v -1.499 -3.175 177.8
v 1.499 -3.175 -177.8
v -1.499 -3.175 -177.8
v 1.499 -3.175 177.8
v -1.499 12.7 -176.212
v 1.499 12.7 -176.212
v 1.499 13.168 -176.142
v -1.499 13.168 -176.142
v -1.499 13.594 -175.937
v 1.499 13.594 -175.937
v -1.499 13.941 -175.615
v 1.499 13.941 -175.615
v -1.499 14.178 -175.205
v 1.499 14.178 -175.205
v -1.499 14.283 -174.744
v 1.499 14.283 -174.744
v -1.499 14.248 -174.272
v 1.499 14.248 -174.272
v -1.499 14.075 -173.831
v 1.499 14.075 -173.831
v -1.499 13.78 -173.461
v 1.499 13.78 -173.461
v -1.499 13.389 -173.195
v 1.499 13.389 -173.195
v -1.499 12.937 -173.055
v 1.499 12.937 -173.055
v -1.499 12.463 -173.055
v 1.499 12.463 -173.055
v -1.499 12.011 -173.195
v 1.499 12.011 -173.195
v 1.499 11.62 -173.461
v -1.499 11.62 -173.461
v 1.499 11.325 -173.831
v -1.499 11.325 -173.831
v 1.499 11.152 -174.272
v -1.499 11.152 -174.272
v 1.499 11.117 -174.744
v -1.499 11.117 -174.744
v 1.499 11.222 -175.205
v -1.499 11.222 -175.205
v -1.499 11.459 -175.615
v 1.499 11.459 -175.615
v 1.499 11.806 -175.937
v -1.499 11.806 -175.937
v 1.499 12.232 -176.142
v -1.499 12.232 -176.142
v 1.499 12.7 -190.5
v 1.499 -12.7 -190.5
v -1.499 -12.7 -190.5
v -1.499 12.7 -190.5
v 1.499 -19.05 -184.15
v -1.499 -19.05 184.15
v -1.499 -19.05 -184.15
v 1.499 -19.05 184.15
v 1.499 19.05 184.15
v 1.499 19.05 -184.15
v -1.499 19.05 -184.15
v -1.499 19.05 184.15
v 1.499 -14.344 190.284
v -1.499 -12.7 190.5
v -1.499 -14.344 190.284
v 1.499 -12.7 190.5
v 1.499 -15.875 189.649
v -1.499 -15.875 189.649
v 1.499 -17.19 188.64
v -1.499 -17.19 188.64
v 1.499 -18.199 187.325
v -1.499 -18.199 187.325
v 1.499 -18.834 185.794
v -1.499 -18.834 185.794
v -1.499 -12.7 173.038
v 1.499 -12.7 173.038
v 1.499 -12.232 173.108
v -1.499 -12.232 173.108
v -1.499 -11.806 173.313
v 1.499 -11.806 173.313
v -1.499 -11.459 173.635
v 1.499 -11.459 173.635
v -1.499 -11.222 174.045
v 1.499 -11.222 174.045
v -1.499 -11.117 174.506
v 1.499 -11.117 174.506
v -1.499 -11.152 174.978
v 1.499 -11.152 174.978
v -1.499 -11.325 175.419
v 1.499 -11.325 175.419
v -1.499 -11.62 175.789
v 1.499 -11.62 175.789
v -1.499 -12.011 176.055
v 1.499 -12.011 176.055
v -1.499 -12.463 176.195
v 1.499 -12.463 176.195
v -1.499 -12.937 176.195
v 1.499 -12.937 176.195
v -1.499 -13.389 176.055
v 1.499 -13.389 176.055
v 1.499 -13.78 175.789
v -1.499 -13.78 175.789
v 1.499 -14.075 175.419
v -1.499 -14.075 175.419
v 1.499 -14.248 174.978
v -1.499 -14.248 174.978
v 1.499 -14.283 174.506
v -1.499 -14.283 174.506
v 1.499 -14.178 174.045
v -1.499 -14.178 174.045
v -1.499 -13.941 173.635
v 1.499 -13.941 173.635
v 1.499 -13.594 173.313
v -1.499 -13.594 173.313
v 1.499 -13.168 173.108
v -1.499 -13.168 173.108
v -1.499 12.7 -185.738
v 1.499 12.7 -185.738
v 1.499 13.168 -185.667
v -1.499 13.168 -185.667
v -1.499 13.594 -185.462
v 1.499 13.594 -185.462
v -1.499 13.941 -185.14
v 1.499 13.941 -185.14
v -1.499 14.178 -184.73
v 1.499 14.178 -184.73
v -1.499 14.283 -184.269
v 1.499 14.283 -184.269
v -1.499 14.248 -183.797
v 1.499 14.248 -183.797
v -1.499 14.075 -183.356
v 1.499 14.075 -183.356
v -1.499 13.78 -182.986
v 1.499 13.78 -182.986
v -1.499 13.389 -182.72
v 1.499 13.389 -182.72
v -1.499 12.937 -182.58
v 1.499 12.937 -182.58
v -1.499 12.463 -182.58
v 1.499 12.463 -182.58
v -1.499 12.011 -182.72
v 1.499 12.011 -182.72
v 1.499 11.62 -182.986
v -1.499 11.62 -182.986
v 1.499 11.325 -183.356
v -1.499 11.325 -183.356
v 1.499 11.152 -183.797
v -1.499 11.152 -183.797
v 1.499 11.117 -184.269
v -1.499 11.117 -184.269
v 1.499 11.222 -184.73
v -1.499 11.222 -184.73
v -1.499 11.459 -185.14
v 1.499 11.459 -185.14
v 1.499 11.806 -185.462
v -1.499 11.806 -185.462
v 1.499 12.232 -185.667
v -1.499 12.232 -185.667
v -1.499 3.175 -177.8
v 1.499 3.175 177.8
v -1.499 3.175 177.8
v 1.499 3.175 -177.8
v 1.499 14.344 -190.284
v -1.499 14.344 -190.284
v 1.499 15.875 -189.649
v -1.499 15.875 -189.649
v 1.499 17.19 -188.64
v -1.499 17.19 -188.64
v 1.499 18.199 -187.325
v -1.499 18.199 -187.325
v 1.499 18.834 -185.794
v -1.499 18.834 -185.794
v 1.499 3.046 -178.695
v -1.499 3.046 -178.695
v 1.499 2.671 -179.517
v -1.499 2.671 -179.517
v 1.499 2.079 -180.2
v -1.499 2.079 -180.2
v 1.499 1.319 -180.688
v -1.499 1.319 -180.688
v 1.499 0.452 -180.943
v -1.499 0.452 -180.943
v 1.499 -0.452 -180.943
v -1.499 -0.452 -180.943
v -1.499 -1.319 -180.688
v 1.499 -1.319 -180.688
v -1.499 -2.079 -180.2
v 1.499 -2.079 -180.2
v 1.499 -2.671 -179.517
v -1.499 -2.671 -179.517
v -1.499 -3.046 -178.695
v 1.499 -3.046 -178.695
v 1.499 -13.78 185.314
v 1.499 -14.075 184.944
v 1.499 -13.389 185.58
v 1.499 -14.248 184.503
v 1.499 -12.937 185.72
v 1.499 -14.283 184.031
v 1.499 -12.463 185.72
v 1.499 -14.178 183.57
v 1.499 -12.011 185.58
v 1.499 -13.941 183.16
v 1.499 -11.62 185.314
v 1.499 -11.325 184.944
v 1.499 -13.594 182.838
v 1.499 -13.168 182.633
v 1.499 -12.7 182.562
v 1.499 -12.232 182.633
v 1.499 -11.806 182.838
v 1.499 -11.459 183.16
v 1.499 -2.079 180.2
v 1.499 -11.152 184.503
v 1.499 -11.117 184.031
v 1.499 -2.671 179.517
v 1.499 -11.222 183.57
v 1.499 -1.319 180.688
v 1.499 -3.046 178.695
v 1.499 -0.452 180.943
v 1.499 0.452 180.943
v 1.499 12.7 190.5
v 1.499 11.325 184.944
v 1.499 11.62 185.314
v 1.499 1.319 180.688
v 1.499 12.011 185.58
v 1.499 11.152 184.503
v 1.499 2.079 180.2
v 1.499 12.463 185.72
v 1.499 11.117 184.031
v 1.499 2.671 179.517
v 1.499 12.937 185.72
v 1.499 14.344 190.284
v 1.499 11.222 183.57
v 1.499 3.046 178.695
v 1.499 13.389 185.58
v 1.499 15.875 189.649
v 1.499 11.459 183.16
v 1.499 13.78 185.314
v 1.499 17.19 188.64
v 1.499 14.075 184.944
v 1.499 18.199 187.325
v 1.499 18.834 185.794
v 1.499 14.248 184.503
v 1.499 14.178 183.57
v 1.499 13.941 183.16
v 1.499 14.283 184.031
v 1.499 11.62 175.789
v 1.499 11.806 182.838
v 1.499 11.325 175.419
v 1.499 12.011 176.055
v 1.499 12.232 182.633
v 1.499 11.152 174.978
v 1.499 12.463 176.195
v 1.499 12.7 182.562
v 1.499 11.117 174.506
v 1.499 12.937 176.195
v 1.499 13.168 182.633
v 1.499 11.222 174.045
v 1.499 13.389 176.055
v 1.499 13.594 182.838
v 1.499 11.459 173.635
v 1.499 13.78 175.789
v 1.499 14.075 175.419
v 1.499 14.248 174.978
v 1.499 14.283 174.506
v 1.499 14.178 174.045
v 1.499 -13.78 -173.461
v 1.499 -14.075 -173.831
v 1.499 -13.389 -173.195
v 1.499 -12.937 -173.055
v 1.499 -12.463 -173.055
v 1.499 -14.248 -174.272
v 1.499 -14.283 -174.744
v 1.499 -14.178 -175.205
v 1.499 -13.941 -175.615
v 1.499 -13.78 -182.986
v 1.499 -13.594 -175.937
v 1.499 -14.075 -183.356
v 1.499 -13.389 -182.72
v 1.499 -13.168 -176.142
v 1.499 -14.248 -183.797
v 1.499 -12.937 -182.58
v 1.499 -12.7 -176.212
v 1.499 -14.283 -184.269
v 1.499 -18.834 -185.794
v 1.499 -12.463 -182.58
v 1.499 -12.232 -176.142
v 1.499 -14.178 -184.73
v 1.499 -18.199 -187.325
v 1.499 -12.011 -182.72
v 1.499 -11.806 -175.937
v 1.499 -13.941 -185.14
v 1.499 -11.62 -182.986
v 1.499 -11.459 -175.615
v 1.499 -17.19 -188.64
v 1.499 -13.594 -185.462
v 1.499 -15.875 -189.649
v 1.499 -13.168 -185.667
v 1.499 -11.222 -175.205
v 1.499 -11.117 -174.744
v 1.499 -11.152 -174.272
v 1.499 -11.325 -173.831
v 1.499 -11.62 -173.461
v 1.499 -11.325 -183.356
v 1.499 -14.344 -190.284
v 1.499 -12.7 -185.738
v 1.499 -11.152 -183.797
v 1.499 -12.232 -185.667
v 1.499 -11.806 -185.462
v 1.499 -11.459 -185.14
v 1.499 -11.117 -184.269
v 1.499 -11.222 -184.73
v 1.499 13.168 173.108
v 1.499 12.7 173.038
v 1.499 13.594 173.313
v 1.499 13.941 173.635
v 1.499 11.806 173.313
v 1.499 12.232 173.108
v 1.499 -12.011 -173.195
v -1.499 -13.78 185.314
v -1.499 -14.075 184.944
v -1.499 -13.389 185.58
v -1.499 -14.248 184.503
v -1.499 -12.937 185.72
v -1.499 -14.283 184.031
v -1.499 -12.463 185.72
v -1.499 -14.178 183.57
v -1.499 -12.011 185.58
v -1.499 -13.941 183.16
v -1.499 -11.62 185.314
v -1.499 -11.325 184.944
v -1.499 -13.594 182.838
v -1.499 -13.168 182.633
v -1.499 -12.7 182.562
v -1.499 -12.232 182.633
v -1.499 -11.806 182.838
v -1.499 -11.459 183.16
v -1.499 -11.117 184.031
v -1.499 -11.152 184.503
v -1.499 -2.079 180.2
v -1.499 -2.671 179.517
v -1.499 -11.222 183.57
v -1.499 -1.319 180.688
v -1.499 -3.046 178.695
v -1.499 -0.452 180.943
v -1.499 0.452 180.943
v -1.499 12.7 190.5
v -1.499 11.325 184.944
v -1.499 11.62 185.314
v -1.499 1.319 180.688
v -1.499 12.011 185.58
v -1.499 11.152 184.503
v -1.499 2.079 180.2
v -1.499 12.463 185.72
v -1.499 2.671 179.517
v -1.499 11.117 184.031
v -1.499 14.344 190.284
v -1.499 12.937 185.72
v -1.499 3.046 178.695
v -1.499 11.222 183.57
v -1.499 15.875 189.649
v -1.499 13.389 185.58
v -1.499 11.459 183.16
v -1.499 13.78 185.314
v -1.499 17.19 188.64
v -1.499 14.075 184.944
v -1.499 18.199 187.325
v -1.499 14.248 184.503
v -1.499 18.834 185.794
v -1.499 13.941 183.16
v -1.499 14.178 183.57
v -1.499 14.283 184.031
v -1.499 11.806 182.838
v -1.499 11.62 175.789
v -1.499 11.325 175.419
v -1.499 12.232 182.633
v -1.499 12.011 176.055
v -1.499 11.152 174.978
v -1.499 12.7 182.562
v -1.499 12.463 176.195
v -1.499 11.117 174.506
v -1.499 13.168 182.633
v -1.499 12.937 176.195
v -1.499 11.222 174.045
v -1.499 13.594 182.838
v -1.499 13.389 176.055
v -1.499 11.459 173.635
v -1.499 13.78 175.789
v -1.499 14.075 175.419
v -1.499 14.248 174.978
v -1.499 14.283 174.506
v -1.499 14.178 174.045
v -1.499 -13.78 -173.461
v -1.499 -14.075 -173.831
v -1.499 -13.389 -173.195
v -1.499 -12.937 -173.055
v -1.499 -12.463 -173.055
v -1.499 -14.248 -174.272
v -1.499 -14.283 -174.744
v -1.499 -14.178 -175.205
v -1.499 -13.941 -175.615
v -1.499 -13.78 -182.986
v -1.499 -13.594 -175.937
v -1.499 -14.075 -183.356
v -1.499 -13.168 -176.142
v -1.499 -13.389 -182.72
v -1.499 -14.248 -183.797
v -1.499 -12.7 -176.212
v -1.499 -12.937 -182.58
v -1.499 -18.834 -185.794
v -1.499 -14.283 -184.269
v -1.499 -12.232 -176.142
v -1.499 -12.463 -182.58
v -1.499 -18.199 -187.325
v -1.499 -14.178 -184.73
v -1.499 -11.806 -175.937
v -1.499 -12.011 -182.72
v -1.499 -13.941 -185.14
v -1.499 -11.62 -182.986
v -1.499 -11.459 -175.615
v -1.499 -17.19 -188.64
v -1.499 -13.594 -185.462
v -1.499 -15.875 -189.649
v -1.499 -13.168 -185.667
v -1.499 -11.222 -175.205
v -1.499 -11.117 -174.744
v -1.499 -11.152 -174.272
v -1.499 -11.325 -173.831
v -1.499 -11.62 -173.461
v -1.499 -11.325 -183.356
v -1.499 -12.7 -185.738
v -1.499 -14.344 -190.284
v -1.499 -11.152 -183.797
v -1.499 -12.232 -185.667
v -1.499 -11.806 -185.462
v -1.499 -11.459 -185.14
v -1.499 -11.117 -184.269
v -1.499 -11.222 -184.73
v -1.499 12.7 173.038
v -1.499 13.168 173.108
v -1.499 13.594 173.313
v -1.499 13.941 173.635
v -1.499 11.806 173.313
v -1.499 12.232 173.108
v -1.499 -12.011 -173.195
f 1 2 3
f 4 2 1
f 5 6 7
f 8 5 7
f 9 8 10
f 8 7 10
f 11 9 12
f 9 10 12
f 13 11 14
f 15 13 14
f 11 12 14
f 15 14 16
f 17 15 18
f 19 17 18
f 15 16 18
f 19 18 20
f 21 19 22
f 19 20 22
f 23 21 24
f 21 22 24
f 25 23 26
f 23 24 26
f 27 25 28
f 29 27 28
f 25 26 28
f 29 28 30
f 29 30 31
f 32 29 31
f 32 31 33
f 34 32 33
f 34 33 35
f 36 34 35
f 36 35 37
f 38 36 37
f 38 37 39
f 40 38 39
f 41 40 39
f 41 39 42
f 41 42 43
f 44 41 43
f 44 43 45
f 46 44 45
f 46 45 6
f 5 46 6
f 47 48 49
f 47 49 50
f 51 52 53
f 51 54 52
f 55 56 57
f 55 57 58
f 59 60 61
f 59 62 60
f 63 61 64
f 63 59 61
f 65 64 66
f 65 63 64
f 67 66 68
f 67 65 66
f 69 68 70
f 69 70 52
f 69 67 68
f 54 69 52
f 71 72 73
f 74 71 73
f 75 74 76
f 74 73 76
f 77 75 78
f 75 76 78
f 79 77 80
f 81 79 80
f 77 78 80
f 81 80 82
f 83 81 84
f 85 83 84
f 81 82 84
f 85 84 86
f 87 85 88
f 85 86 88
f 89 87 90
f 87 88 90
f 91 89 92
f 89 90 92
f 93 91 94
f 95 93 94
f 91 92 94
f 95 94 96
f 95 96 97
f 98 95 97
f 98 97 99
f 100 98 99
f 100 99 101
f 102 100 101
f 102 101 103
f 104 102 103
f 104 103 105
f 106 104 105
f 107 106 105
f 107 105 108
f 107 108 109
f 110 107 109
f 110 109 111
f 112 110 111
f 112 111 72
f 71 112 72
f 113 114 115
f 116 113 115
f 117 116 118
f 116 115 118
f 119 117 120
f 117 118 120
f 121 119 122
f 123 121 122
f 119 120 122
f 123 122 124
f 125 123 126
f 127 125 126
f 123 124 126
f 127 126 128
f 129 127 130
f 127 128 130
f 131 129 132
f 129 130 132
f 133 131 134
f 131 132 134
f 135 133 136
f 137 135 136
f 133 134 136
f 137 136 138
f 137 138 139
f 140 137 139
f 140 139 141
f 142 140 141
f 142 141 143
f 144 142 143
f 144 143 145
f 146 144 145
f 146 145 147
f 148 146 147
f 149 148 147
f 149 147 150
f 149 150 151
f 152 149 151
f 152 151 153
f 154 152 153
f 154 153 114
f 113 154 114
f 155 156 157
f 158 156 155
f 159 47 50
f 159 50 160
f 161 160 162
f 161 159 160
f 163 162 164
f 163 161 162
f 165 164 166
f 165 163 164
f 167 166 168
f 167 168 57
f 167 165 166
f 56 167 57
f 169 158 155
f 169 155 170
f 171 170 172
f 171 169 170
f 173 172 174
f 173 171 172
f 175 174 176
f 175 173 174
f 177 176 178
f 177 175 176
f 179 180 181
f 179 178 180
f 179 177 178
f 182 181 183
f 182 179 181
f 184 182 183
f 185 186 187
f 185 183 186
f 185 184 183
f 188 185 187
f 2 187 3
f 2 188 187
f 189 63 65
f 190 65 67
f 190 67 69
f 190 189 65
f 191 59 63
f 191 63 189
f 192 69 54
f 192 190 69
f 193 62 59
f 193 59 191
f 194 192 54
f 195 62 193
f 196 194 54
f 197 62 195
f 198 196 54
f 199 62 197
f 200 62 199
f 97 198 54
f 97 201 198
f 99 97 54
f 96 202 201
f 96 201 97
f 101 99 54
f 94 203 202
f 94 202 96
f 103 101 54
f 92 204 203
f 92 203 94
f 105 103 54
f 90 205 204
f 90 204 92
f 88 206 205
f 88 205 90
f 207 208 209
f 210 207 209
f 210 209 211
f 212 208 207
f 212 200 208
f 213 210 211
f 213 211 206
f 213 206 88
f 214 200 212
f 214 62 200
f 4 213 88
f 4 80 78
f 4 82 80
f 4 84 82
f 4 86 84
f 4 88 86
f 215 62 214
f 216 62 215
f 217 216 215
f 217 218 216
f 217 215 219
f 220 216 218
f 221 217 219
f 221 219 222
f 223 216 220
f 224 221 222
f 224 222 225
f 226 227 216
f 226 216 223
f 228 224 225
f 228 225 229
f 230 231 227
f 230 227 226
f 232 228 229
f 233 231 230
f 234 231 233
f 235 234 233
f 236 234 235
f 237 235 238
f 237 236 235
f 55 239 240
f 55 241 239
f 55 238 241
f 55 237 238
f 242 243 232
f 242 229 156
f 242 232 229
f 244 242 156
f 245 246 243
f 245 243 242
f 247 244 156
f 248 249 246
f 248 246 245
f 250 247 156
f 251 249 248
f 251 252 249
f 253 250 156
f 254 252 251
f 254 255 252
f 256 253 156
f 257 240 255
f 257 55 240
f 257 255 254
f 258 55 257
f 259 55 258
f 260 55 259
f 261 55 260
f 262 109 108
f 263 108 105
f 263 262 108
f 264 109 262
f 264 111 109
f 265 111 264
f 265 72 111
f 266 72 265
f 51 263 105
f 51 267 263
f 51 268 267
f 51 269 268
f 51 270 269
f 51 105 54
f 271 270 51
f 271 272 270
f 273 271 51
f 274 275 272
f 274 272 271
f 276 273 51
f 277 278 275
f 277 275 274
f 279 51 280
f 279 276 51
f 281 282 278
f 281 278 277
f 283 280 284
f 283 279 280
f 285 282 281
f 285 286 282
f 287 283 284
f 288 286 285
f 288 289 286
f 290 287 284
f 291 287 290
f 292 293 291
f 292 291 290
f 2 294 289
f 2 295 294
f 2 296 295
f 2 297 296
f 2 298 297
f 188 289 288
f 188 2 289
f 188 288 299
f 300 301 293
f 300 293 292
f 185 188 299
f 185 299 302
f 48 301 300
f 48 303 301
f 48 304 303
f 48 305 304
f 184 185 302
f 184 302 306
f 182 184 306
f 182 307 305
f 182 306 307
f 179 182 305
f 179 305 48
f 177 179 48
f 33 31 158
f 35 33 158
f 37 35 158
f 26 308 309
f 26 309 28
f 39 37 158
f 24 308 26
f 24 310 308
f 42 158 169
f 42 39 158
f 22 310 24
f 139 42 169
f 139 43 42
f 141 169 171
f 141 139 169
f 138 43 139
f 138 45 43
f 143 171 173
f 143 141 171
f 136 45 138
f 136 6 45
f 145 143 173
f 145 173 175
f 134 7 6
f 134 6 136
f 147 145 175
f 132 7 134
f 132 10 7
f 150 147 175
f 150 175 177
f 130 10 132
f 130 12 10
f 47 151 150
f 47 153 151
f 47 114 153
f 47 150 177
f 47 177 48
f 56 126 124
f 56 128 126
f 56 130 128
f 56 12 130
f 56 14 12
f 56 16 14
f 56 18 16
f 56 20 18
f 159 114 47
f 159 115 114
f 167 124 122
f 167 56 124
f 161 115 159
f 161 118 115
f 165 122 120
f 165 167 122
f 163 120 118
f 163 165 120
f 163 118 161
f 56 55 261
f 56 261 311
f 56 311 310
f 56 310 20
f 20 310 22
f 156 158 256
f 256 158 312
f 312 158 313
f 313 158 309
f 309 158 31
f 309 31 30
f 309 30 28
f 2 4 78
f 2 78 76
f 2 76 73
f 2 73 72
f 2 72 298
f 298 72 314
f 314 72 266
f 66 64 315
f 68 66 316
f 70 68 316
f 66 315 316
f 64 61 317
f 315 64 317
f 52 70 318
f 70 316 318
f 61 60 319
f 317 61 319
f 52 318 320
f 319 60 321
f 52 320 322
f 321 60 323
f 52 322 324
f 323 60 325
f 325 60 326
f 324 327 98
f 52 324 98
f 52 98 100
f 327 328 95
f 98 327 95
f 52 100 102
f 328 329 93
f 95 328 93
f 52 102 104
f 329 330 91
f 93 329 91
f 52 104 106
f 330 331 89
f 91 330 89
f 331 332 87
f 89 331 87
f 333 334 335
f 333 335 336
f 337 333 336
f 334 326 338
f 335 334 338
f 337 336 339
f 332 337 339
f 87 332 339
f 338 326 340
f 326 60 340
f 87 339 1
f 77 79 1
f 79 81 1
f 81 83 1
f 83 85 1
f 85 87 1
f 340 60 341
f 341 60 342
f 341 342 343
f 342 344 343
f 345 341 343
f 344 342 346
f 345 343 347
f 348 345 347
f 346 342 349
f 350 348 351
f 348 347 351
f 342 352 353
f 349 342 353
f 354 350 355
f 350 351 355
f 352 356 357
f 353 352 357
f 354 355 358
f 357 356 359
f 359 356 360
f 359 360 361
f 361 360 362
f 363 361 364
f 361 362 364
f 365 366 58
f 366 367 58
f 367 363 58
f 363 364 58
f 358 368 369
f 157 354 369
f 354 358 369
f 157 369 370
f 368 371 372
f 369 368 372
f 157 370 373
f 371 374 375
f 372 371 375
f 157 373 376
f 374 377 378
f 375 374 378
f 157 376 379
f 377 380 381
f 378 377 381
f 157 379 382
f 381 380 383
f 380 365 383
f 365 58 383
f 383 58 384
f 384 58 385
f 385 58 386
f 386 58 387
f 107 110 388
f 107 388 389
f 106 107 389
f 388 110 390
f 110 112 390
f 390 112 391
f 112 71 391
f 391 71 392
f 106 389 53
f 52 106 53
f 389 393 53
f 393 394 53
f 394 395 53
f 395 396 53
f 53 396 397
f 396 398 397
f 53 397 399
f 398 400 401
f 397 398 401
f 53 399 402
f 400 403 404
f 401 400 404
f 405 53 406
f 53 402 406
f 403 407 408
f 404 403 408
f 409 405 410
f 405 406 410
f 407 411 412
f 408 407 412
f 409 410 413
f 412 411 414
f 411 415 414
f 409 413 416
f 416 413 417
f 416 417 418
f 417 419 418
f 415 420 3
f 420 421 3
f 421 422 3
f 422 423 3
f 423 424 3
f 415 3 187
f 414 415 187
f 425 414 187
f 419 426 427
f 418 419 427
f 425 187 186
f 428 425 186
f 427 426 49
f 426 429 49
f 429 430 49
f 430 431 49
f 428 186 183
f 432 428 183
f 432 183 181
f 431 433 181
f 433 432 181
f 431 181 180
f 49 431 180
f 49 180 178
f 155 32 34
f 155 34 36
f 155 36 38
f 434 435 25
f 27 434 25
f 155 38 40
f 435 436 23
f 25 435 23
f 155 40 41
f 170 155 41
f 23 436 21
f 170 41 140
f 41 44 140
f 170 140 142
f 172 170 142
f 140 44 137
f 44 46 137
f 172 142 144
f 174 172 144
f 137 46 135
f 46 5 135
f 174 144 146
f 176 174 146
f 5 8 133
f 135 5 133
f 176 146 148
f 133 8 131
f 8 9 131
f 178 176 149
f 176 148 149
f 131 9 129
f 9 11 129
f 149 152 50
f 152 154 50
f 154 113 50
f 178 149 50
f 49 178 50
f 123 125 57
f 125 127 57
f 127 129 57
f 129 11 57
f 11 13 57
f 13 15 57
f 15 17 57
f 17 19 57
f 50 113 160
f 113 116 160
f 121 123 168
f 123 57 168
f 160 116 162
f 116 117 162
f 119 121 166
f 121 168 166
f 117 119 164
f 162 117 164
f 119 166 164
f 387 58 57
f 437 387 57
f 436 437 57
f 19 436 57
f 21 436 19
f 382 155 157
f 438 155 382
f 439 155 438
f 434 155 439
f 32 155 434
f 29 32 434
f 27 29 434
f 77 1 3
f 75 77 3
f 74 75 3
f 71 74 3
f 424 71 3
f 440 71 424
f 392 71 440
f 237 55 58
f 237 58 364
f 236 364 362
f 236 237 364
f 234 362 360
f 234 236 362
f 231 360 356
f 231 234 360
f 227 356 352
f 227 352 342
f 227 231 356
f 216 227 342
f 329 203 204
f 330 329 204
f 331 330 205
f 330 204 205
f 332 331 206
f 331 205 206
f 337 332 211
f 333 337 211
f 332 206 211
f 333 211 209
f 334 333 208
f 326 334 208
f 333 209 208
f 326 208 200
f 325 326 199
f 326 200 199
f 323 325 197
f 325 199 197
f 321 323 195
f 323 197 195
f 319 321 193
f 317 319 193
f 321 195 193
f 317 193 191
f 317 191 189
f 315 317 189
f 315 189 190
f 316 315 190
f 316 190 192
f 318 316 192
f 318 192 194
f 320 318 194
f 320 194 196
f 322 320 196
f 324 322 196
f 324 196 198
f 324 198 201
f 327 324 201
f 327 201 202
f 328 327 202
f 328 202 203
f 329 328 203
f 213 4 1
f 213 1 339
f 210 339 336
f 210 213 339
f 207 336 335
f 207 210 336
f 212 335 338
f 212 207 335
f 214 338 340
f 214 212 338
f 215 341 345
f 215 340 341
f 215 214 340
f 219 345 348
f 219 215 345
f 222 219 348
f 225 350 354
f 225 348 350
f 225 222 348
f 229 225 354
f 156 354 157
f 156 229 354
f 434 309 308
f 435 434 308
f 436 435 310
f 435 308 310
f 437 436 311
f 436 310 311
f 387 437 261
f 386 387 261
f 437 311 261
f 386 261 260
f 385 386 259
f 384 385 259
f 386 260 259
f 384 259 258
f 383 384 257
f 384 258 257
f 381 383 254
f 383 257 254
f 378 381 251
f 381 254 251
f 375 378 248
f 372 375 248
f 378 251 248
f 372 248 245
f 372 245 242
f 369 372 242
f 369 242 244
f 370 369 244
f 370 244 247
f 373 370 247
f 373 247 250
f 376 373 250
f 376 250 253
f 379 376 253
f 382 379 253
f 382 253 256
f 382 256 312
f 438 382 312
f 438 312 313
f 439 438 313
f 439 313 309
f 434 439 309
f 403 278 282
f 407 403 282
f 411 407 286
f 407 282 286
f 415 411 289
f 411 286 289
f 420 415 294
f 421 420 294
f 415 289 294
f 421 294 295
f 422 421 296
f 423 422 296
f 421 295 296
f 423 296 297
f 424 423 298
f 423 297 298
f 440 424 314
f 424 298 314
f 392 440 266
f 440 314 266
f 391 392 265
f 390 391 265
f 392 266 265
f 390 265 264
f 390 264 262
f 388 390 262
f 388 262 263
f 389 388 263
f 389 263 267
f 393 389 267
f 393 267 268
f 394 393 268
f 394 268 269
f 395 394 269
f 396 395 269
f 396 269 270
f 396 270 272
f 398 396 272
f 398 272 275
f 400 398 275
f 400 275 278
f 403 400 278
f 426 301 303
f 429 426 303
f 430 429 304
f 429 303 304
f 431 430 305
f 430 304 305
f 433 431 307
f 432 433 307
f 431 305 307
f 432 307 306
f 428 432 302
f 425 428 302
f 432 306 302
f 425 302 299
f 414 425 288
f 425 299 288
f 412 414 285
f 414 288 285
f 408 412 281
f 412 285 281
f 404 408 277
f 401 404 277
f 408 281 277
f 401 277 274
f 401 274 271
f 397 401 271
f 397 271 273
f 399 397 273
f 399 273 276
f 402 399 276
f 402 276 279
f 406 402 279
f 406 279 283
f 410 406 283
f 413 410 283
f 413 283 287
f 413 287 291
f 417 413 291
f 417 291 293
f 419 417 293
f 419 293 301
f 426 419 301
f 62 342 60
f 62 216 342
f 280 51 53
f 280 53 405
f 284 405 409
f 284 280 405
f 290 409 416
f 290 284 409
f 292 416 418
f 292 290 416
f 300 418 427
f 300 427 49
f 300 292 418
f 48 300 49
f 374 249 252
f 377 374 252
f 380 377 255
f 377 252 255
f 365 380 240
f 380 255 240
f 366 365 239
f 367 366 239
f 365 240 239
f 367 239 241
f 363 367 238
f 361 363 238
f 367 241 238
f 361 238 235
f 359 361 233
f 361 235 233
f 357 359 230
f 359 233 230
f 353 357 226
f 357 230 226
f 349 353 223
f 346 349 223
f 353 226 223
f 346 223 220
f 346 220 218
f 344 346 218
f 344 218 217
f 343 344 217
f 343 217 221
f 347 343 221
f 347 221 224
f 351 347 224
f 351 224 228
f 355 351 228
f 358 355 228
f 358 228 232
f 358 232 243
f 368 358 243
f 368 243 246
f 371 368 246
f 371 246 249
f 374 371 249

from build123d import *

# Parameters (mm, degrees)
OUTER_CUT_DEPTH   = 1.4986
SLOTS_DEPTH       = 192.473590105
SKETCH3_R         = 1.5875
MOUNT_HOLES_DEPTH = 192.473590105


with BuildPart() as part:
    # Sketch1 → Outer Cut (new, symmetric)
    with BuildSketch(Plane(origin=(0, 0, 0), x_dir=(0, 0, -1), z_dir=(1, 0, 0))):
        with BuildLine():
            Line((-184.15, -19.05), (184.15, -19.05))
            ThreePointArc((184.15, -19.05), (188.640128061, -17.190128061), (190.5, -12.7))
            Line((190.5, -12.7), (190.5, 12.7))
            ThreePointArc((190.5, 12.7), (188.640128061, 17.190128061), (184.15, 19.05))
            Line((184.15, 19.05), (-184.15, 19.05))
            ThreePointArc((-184.15, 19.05), (-188.640128061, 17.190128061), (-190.5, 12.7))
            Line((-190.5, 12.7), (-190.5, -12.7))
            ThreePointArc((-190.5, -12.7), (-188.640128061, -17.190128061), (-184.15, -19.05))
        make_face()
    extrude(amount=OUTER_CUT_DEPTH, both=True)

    # Sketch2 → Slots (cut, through all)
    with BuildSketch(Plane(origin=(1.4986, 0, 0), x_dir=(0, 0, -1), z_dir=(1, 0, 0))):
        with BuildLine():
            Line((-177.8, 3.175), (177.8, 3.175))
            ThreePointArc((177.8, 3.175), (180.975, 0), (177.8, -3.175))
            Line((177.8, -3.175), (-177.8, -3.175))
            ThreePointArc((-177.8, -3.175), (-180.975, 0), (-177.8, 3.175))
        make_face()
    extrude(amount=-SLOTS_DEPTH, mode=Mode.SUBTRACT)

    # Sketch3 → Mount Holes (cut, through all)
    with BuildSketch(Plane(origin=(1.4986, 0, 0), x_dir=(0, 0, -1), z_dir=(1, 0, 0))):
        with Locations((-184.15, 12.7)):
            Circle(SKETCH3_R)
        with Locations((-174.625, 12.7)):
            Circle(SKETCH3_R)
        with Locations((-174.625, -12.7)):
            Circle(SKETCH3_R)
        with Locations((-184.15, -12.7)):
            Circle(SKETCH3_R)
        with Locations((174.625, 12.7)):
            Circle(SKETCH3_R)
        with Locations((184.15, 12.7)):
            Circle(SKETCH3_R)
        with Locations((184.15, -12.7)):
            Circle(SKETCH3_R)
        with Locations((174.625, -12.7)):
            Circle(SKETCH3_R)
    extrude(amount=-MOUNT_HOLES_DEPTH, mode=Mode.SUBTRACT)


solid = part.part
